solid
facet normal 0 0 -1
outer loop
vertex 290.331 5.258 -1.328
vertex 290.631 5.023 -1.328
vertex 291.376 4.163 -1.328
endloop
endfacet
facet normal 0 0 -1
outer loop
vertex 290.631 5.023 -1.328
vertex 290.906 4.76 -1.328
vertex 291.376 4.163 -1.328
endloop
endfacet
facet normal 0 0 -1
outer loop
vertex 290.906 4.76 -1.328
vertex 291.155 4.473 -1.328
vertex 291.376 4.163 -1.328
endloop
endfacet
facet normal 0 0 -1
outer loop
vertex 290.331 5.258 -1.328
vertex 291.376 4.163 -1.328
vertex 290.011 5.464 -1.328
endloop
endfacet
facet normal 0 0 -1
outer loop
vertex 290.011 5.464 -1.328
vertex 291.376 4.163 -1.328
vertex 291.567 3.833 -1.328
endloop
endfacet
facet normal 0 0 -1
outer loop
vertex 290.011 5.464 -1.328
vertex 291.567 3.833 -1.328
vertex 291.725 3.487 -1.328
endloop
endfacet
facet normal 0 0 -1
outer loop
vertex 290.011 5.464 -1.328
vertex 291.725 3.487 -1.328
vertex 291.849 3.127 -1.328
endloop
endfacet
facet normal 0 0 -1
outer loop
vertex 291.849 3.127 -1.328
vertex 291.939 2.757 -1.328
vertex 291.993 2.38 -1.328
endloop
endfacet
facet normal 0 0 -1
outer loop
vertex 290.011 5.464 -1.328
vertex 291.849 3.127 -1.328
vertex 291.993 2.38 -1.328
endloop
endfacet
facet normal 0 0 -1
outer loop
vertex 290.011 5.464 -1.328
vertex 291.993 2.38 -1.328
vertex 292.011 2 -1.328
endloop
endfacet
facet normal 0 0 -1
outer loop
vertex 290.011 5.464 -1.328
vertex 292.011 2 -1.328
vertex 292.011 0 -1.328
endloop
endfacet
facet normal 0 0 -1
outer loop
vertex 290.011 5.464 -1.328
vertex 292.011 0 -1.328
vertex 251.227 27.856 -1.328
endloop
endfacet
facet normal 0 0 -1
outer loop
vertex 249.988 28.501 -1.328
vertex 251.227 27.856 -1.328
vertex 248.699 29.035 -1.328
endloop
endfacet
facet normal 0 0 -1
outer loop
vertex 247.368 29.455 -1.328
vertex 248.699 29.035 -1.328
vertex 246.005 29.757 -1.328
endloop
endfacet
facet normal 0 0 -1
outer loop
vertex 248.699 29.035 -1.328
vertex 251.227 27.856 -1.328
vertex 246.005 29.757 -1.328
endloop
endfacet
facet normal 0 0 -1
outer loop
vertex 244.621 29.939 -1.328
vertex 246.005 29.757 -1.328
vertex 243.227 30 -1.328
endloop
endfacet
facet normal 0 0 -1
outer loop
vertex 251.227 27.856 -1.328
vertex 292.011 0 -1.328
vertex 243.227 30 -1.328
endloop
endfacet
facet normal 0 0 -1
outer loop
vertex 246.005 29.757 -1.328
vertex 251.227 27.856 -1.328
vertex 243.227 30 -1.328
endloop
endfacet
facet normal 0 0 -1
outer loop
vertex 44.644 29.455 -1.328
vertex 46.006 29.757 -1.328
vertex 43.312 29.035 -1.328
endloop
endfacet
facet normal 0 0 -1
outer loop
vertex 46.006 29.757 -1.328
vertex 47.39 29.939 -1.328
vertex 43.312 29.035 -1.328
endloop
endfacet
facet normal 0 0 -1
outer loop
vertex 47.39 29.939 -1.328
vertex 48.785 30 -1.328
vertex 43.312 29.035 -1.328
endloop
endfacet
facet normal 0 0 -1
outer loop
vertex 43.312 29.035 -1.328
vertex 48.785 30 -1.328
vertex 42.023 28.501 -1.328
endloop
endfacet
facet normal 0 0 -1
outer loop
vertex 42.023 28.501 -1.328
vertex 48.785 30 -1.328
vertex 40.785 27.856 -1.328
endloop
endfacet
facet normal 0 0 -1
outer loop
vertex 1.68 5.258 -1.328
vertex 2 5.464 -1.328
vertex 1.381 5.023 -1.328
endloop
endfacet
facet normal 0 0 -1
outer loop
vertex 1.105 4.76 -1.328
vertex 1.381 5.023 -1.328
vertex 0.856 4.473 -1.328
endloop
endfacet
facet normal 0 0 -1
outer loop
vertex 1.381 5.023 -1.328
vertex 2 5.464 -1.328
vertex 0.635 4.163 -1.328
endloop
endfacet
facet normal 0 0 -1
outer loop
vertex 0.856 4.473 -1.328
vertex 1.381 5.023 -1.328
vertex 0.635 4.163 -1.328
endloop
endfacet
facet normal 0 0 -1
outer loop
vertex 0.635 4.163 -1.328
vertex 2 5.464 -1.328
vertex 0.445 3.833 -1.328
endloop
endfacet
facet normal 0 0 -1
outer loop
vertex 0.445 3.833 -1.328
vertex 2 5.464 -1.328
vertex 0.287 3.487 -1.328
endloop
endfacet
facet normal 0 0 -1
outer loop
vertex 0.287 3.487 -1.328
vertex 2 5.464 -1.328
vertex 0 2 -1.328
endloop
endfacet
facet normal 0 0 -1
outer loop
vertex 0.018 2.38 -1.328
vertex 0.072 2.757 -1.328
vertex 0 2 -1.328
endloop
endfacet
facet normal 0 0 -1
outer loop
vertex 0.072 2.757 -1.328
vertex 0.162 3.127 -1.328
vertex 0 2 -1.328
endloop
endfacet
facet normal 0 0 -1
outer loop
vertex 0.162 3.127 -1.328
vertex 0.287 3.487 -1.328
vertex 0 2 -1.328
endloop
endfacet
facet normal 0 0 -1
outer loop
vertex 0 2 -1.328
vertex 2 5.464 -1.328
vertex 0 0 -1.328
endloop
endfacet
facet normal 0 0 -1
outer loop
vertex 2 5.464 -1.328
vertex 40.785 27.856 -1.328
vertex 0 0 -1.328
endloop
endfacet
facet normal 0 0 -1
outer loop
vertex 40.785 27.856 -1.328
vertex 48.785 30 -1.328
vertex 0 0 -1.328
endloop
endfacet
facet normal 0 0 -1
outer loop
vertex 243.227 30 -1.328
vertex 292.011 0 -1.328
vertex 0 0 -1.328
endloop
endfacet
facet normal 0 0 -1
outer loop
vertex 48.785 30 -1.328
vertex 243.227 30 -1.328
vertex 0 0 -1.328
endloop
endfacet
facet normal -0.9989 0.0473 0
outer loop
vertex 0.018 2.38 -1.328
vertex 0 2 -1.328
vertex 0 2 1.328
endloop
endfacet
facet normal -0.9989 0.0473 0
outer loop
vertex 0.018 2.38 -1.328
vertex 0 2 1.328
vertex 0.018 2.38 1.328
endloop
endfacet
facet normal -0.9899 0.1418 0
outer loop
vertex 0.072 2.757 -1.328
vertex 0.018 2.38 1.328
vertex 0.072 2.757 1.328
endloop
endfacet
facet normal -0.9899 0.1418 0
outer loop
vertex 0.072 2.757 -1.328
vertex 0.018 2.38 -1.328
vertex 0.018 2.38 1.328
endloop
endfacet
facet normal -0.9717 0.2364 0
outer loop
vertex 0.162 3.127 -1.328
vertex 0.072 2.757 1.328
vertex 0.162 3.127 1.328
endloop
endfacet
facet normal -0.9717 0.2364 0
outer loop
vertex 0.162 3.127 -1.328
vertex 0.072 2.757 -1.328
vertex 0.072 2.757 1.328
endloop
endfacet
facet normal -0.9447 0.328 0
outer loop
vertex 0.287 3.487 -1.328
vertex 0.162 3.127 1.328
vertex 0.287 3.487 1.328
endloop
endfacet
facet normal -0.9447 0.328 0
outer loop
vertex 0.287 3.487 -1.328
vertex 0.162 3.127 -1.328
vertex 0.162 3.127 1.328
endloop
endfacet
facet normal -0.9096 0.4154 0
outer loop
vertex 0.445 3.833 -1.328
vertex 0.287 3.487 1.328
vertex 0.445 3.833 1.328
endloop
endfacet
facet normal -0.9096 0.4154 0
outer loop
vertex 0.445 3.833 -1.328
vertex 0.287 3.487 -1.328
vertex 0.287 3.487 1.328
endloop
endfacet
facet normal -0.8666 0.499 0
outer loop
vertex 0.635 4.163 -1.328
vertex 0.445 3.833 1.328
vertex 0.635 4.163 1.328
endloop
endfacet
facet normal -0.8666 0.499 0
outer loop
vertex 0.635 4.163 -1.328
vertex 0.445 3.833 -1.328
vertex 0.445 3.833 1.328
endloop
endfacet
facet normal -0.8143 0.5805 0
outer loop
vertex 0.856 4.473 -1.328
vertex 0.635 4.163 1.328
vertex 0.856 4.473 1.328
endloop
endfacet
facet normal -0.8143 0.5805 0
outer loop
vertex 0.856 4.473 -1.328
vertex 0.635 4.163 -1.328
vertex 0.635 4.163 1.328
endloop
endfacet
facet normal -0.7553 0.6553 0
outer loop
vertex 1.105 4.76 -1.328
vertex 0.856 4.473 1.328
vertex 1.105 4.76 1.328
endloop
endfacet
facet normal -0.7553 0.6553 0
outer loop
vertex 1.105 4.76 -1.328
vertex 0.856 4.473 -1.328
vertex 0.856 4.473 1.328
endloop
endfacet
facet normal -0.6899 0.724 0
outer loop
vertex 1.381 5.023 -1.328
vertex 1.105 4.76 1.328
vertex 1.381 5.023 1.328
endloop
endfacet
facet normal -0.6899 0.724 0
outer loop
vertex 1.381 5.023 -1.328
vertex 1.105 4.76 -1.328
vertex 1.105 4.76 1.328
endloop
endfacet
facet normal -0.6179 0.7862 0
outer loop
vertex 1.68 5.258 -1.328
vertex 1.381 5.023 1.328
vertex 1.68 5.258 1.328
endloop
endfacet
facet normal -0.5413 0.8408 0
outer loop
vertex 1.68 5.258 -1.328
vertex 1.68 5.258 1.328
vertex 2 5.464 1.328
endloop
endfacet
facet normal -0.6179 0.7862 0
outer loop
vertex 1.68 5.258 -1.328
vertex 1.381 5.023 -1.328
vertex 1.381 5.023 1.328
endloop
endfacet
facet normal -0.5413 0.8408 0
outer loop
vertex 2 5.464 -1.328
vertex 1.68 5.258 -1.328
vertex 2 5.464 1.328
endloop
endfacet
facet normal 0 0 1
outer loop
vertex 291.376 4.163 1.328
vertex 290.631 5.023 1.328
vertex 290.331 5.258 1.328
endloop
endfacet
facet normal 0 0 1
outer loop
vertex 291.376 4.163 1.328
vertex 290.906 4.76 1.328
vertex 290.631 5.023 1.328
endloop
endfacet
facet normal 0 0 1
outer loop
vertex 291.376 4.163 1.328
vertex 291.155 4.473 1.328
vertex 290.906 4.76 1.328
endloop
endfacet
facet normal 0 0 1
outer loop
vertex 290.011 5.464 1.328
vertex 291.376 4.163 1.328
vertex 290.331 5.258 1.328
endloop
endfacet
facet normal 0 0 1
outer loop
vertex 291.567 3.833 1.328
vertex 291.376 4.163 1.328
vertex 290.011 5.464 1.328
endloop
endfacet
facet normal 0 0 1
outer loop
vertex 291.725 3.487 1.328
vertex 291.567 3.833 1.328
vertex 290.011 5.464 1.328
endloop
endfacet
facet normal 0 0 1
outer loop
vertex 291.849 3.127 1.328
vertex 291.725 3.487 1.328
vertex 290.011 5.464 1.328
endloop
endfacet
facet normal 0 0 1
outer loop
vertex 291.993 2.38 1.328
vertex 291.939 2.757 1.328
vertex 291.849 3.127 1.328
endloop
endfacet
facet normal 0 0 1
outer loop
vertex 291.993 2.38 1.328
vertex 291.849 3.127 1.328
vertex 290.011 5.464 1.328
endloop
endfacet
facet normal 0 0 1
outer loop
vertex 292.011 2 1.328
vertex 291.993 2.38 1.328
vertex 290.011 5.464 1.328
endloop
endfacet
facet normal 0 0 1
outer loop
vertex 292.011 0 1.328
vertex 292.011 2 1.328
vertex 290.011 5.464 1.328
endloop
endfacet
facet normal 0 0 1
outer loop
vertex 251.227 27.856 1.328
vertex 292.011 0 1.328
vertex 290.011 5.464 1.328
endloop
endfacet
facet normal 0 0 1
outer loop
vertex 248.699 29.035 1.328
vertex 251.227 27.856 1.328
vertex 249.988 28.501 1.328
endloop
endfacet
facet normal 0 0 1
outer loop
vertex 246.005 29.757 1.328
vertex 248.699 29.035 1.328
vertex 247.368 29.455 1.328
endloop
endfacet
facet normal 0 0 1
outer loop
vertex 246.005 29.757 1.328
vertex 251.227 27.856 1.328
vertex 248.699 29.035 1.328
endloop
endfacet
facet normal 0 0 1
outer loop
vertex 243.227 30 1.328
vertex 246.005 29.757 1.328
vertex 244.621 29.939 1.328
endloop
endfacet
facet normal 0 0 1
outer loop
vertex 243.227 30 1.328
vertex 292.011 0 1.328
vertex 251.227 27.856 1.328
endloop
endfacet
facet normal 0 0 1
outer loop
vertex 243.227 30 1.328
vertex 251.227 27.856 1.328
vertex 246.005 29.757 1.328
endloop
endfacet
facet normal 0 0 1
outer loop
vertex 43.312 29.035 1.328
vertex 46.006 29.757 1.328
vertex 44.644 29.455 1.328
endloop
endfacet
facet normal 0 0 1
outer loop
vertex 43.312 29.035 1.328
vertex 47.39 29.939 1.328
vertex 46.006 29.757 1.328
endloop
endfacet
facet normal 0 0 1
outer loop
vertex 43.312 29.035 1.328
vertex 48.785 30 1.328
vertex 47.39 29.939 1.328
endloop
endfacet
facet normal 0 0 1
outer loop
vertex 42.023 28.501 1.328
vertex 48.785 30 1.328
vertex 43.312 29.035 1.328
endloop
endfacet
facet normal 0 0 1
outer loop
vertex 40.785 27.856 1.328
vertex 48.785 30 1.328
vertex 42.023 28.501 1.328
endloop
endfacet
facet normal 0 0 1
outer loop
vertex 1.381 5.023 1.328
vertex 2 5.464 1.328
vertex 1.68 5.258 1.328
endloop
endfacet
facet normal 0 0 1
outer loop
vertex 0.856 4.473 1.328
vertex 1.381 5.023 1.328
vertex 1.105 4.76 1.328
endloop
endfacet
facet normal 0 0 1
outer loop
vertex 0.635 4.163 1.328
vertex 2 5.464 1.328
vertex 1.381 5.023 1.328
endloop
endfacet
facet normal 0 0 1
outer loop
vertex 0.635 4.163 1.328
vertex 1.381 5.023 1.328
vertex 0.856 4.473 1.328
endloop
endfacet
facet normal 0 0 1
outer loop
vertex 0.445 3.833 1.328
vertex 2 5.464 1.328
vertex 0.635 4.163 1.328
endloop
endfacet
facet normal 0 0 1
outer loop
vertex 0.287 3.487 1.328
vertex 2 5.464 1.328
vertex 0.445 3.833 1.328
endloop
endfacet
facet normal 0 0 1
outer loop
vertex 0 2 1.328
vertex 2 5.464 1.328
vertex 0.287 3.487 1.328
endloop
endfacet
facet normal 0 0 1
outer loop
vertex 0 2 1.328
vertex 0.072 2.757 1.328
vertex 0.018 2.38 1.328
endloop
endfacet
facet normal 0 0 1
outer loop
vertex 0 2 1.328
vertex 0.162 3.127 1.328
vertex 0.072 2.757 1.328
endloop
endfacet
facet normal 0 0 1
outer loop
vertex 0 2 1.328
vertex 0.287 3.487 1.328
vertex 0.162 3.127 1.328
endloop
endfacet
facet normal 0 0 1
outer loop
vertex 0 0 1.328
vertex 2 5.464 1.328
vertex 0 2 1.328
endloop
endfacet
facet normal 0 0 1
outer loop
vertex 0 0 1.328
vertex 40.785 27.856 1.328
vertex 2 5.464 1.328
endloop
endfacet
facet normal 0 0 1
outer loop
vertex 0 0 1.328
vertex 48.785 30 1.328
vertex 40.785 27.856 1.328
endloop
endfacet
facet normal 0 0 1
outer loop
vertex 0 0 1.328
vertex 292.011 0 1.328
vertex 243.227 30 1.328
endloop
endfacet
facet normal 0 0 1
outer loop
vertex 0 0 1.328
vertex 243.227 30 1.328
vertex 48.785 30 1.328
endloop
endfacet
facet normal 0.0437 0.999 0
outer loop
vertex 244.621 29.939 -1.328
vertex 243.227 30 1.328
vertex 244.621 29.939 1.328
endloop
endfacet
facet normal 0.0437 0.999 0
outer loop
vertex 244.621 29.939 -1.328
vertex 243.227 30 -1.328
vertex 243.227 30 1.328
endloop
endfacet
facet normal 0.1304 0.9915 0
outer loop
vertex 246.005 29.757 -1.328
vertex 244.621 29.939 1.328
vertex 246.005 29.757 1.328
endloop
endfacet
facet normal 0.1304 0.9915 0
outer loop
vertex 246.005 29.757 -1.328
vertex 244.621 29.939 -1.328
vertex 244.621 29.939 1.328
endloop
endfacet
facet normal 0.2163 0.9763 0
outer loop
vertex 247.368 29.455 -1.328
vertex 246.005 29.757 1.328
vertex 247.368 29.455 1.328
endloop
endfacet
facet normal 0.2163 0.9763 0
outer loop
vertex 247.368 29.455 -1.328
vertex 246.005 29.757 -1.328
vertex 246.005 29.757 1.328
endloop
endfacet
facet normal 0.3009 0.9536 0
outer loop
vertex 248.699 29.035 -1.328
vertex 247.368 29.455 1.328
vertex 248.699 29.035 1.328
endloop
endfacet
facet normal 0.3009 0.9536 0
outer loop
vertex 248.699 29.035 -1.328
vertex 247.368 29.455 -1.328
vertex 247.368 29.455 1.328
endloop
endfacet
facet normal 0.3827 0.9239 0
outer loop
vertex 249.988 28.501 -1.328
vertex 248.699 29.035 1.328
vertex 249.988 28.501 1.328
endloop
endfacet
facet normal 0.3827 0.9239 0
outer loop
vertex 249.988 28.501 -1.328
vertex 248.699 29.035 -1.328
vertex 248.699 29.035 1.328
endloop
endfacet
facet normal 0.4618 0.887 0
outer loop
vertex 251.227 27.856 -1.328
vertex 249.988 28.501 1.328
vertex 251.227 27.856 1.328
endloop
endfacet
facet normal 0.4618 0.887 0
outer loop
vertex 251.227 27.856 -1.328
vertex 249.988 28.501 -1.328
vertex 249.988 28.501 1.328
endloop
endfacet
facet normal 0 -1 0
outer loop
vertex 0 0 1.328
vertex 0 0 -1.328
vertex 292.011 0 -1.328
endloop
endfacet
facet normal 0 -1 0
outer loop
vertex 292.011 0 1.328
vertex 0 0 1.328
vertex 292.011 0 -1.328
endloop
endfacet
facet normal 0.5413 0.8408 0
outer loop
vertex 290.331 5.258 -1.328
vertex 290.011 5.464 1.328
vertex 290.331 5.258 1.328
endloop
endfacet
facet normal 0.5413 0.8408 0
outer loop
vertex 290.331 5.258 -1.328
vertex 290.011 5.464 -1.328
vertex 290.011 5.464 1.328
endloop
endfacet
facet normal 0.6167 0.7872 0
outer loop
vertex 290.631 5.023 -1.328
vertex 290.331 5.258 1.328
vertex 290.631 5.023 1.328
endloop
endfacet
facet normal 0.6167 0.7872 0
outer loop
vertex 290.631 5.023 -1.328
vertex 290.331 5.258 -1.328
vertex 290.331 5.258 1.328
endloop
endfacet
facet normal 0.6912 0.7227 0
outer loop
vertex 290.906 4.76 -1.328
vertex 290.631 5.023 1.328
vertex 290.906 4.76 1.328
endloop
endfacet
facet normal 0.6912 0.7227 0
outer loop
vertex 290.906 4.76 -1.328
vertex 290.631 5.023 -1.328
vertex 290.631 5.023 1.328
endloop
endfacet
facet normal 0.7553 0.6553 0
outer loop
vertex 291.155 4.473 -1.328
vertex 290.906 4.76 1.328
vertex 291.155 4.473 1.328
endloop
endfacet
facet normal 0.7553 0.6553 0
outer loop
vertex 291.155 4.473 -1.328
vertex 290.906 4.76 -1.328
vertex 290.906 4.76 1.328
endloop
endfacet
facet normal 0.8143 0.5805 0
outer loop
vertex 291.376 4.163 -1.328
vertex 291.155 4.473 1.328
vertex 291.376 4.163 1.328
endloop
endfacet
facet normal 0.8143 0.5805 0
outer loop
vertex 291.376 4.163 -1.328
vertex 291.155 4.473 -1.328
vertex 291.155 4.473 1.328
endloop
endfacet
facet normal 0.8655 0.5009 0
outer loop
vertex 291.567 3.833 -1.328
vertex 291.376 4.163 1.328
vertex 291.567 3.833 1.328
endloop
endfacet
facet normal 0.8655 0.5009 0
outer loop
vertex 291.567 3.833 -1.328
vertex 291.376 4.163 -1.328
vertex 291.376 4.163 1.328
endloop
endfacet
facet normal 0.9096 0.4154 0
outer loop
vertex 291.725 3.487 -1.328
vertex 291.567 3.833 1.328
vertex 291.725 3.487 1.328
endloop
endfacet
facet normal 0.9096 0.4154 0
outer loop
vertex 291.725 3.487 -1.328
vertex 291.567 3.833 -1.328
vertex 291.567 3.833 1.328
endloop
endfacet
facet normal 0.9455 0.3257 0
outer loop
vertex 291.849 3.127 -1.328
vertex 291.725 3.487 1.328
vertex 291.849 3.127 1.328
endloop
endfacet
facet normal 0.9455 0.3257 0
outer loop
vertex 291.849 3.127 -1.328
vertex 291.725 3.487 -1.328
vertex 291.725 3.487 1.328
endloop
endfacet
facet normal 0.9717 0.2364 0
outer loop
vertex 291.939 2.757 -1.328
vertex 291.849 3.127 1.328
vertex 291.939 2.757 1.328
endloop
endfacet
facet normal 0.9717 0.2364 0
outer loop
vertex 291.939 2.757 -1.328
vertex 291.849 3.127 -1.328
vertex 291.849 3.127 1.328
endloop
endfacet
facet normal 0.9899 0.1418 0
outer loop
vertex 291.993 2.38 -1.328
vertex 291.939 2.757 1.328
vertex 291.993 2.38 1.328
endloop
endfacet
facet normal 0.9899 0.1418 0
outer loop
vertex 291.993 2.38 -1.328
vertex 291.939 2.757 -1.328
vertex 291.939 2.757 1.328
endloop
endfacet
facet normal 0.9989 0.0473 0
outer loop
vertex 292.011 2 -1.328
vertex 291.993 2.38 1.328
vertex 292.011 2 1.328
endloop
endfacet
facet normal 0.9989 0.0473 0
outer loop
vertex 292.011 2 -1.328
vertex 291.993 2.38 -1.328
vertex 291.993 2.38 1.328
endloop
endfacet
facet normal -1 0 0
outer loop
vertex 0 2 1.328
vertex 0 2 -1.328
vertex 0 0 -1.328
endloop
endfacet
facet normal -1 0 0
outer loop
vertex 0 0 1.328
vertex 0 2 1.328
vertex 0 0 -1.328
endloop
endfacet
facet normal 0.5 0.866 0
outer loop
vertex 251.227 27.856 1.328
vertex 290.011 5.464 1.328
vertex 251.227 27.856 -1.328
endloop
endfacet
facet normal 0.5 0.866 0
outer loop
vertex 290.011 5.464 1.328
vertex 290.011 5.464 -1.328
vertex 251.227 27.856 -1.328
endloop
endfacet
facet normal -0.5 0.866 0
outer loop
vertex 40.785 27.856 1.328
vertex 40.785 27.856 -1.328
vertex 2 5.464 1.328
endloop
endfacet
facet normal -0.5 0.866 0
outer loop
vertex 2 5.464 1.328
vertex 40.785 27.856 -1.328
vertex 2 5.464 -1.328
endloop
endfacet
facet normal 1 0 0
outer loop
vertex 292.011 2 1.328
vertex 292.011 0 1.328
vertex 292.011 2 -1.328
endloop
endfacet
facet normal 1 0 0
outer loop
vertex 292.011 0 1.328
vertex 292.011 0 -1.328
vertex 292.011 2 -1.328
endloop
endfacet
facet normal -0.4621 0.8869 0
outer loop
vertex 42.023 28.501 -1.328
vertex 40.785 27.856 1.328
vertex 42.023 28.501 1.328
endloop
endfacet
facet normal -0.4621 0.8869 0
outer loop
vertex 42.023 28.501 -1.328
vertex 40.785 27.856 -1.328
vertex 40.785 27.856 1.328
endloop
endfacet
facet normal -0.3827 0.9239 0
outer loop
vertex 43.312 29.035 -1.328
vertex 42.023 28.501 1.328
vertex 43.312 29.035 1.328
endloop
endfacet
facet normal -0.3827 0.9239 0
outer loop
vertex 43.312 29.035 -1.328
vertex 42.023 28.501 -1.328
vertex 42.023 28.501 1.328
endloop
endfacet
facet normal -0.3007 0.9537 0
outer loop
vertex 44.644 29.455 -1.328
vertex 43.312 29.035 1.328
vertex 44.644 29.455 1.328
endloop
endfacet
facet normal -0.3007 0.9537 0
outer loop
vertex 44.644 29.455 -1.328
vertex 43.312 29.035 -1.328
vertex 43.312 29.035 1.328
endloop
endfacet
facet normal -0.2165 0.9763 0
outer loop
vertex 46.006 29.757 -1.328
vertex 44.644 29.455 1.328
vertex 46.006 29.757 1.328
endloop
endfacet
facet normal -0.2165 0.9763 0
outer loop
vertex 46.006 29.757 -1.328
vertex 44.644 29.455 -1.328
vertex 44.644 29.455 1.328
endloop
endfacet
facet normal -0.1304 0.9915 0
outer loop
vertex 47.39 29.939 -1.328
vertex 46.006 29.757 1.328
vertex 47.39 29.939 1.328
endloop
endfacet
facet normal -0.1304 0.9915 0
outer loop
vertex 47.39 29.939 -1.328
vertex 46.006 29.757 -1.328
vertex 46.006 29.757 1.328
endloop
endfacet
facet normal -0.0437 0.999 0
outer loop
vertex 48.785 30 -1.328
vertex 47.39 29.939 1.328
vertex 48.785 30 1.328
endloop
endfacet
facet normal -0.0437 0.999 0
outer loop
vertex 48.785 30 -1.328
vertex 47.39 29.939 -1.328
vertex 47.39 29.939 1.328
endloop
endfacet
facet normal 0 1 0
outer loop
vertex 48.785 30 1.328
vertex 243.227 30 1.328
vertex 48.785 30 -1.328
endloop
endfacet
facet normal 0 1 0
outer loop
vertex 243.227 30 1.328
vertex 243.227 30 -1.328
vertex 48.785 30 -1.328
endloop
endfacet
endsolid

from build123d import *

# Parameters (mm, degrees)
PAD_DEPTH = 1.328


with BuildPart() as part:
    # Sketch → Pad (new body, symmetric)
    with BuildSketch(Plane(origin=(78.011172, 0, 0), x_dir=(1, 0, 0), z_dir=(0, 0, -1))):
        with BuildLine():
            Line((-78.011172, 0), (214, 0))
            Line((214, 0), (214, -2))
            ThreePointArc((212, -5.464102), (213.464102, -4), (214, -2))
            Line((212, -5.464102), (173.21539, -27.856406))
            ThreePointArc((165.21539, -30), (169.356495, -29.454813), (173.21539, -27.856406))
            Line((165.21539, -30), (-29.226562, -30))
            ThreePointArc((-37.226562, -27.856406), (-33.367667, -29.454813), (-29.226562, -30))
            Line((-37.226562, -27.856406), (-76.011172, -5.464102))
            ThreePointArc((-78.011172, -2), (-77.475274, -4), (-76.011172, -5.464102))
            Line((-78.011172, -2), (-78.011172, 0))
        make_face()
    extrude(amount=PAD_DEPTH, both=True)


solid = part.part
